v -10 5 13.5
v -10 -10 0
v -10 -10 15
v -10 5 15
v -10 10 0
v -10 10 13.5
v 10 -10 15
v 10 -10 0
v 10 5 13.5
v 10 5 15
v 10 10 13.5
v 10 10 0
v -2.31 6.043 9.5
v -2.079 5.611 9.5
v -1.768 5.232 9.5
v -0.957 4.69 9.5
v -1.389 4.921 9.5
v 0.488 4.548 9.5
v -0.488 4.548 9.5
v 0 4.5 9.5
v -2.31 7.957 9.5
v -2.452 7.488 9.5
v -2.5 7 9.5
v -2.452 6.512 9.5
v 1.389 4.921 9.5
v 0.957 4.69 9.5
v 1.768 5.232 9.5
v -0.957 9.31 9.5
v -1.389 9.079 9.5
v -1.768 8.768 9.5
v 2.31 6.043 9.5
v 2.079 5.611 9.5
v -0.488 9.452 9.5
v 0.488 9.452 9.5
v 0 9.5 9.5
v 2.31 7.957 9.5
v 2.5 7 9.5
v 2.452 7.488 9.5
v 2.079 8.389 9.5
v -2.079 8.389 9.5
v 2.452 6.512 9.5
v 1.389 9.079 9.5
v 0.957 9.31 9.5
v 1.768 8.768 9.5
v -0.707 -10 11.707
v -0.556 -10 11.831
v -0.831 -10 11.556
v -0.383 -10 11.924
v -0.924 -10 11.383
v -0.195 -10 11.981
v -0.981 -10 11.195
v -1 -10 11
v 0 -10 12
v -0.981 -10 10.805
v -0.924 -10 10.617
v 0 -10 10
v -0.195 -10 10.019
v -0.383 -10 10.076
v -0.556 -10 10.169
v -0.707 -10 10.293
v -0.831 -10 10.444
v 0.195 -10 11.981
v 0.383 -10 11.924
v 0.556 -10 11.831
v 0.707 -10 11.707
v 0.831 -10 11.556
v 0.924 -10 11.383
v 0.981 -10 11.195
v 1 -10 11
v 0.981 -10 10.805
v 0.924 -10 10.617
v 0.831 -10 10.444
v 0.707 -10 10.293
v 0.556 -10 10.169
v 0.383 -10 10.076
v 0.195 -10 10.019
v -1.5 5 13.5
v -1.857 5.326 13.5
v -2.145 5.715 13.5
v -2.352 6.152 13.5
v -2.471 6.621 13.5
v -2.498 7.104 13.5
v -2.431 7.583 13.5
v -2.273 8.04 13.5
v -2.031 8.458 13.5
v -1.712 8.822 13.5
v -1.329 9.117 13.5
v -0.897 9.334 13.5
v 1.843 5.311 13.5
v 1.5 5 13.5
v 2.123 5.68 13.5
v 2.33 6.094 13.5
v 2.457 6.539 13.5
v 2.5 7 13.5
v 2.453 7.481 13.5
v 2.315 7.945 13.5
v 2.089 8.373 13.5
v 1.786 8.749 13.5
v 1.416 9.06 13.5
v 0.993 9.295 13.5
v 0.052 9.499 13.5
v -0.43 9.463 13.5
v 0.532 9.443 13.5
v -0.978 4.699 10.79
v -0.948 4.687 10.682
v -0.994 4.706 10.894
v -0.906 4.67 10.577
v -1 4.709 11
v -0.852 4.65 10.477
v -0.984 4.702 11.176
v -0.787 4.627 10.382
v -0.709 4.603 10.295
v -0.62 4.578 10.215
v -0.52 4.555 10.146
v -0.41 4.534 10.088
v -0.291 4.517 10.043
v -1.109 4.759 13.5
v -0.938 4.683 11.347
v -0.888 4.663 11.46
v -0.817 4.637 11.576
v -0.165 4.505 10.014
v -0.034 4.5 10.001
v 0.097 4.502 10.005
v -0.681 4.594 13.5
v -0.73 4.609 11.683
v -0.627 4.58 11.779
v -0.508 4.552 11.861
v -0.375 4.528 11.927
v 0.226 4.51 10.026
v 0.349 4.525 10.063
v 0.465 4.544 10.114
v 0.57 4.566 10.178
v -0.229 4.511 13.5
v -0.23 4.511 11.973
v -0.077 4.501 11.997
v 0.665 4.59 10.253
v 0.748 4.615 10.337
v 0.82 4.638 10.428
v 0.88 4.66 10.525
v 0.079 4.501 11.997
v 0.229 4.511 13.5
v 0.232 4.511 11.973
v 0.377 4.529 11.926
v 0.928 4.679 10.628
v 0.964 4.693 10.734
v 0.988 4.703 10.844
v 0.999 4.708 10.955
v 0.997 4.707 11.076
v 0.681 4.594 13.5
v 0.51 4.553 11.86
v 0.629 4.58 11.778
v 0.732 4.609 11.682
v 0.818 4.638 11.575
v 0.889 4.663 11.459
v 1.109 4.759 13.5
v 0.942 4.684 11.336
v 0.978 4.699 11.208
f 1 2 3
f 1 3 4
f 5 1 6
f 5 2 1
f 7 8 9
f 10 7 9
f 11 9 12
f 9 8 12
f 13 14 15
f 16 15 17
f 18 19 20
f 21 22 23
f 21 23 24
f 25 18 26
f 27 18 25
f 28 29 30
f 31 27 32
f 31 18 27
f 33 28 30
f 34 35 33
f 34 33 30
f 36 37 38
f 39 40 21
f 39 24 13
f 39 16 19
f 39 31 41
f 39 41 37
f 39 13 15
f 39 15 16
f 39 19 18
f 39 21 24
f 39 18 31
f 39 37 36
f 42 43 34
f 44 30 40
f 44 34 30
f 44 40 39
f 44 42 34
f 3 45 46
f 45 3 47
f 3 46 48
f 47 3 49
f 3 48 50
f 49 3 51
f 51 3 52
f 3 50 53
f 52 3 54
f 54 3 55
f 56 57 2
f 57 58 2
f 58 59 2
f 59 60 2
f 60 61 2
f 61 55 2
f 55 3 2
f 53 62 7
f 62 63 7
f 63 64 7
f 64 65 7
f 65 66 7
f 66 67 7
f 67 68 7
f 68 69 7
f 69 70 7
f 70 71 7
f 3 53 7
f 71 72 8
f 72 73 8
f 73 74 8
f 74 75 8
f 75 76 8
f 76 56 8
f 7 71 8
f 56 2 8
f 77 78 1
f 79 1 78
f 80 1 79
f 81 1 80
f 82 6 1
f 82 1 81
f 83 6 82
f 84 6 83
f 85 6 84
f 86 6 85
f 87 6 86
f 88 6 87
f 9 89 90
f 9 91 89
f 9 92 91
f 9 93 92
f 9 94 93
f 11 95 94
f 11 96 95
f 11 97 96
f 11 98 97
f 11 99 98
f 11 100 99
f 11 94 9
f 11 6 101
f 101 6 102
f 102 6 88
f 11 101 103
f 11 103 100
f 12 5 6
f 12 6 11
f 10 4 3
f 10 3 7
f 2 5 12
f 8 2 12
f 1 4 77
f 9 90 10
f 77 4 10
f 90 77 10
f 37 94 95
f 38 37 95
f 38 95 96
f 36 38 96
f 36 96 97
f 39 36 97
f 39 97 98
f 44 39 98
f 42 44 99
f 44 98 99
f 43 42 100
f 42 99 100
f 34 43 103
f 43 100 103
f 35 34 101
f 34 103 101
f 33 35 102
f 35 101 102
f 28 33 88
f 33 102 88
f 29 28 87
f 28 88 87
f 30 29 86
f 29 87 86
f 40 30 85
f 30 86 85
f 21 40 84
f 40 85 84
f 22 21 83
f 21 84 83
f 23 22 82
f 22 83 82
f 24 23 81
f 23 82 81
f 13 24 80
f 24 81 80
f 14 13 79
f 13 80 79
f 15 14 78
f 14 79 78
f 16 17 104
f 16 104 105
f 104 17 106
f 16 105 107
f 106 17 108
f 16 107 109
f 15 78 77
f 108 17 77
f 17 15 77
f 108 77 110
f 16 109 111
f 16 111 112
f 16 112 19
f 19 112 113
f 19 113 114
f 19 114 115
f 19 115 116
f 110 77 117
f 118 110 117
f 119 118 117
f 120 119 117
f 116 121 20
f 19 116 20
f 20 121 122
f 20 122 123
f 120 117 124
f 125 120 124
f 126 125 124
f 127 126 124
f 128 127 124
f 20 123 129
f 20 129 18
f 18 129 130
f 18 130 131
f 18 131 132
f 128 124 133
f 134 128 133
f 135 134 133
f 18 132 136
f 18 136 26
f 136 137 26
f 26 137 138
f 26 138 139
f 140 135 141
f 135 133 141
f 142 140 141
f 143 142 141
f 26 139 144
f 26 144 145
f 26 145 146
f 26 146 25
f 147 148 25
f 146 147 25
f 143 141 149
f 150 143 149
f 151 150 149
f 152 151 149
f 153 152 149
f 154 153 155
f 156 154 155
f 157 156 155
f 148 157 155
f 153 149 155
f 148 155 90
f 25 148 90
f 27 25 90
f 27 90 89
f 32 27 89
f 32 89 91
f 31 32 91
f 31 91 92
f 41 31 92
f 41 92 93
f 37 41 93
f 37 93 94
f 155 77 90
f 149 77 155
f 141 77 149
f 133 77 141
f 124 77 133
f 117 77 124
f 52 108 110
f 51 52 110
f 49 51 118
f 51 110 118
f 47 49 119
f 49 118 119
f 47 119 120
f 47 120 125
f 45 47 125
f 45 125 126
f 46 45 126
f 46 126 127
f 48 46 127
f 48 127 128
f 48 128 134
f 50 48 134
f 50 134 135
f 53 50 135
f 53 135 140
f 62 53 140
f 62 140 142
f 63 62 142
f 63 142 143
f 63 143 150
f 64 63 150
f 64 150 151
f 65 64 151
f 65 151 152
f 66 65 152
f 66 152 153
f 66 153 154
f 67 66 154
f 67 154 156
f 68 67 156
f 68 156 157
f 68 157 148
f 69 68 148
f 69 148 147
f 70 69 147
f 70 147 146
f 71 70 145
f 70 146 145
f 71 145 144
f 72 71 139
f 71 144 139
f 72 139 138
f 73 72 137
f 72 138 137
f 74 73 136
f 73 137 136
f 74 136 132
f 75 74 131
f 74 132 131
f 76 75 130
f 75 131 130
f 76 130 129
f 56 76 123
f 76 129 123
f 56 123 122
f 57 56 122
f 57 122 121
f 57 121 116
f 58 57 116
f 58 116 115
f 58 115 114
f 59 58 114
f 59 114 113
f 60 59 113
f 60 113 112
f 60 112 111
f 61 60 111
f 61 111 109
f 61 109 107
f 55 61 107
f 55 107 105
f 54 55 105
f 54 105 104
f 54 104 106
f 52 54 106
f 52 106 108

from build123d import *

# Parameters (mm, degrees)
F0_W     = 20
F0_H     = 20
F1_DEPTH = 15
F2_W     = 50.179663
F2_H     = 15.178498
F3_DEPTH = 1.5
F4_R     = 2.5
F5_DEPTH = 4
F6_R     = 1
F7_DEPTH = 25


with BuildPart() as f1:
    # F0 (on Top) → F1 (new body)
    with BuildSketch(Plane.XY):
        Rectangle(F0_W, F0_H)
    extrude(amount=F1_DEPTH)

    # F2 (on face) → F3 (cut)
    with BuildSketch(Plane.XY.offset(15)):
        with Locations((-0.497311, 12.589249)):
            Rectangle(F2_W, F2_H)
    extrude(amount=-F3_DEPTH, mode=Mode.SUBTRACT)

    # F4 (on face) → F5 (cut)
    with BuildSketch(Plane.XY.offset(13.5)):
        with Locations((0, 7)):
            Circle(F4_R)
    extrude(amount=-F5_DEPTH, mode=Mode.SUBTRACT)

    # F6 (on face) → F7 (cut)
    with BuildSketch(Plane(origin=(0, 5, 0), x_dir=(-1, 0, 0), z_dir=(0, 1, 0))):
        with Locations((0, 11)):
            Circle(F6_R)
    extrude(amount=-F7_DEPTH, mode=Mode.SUBTRACT)


solid = f1.part
